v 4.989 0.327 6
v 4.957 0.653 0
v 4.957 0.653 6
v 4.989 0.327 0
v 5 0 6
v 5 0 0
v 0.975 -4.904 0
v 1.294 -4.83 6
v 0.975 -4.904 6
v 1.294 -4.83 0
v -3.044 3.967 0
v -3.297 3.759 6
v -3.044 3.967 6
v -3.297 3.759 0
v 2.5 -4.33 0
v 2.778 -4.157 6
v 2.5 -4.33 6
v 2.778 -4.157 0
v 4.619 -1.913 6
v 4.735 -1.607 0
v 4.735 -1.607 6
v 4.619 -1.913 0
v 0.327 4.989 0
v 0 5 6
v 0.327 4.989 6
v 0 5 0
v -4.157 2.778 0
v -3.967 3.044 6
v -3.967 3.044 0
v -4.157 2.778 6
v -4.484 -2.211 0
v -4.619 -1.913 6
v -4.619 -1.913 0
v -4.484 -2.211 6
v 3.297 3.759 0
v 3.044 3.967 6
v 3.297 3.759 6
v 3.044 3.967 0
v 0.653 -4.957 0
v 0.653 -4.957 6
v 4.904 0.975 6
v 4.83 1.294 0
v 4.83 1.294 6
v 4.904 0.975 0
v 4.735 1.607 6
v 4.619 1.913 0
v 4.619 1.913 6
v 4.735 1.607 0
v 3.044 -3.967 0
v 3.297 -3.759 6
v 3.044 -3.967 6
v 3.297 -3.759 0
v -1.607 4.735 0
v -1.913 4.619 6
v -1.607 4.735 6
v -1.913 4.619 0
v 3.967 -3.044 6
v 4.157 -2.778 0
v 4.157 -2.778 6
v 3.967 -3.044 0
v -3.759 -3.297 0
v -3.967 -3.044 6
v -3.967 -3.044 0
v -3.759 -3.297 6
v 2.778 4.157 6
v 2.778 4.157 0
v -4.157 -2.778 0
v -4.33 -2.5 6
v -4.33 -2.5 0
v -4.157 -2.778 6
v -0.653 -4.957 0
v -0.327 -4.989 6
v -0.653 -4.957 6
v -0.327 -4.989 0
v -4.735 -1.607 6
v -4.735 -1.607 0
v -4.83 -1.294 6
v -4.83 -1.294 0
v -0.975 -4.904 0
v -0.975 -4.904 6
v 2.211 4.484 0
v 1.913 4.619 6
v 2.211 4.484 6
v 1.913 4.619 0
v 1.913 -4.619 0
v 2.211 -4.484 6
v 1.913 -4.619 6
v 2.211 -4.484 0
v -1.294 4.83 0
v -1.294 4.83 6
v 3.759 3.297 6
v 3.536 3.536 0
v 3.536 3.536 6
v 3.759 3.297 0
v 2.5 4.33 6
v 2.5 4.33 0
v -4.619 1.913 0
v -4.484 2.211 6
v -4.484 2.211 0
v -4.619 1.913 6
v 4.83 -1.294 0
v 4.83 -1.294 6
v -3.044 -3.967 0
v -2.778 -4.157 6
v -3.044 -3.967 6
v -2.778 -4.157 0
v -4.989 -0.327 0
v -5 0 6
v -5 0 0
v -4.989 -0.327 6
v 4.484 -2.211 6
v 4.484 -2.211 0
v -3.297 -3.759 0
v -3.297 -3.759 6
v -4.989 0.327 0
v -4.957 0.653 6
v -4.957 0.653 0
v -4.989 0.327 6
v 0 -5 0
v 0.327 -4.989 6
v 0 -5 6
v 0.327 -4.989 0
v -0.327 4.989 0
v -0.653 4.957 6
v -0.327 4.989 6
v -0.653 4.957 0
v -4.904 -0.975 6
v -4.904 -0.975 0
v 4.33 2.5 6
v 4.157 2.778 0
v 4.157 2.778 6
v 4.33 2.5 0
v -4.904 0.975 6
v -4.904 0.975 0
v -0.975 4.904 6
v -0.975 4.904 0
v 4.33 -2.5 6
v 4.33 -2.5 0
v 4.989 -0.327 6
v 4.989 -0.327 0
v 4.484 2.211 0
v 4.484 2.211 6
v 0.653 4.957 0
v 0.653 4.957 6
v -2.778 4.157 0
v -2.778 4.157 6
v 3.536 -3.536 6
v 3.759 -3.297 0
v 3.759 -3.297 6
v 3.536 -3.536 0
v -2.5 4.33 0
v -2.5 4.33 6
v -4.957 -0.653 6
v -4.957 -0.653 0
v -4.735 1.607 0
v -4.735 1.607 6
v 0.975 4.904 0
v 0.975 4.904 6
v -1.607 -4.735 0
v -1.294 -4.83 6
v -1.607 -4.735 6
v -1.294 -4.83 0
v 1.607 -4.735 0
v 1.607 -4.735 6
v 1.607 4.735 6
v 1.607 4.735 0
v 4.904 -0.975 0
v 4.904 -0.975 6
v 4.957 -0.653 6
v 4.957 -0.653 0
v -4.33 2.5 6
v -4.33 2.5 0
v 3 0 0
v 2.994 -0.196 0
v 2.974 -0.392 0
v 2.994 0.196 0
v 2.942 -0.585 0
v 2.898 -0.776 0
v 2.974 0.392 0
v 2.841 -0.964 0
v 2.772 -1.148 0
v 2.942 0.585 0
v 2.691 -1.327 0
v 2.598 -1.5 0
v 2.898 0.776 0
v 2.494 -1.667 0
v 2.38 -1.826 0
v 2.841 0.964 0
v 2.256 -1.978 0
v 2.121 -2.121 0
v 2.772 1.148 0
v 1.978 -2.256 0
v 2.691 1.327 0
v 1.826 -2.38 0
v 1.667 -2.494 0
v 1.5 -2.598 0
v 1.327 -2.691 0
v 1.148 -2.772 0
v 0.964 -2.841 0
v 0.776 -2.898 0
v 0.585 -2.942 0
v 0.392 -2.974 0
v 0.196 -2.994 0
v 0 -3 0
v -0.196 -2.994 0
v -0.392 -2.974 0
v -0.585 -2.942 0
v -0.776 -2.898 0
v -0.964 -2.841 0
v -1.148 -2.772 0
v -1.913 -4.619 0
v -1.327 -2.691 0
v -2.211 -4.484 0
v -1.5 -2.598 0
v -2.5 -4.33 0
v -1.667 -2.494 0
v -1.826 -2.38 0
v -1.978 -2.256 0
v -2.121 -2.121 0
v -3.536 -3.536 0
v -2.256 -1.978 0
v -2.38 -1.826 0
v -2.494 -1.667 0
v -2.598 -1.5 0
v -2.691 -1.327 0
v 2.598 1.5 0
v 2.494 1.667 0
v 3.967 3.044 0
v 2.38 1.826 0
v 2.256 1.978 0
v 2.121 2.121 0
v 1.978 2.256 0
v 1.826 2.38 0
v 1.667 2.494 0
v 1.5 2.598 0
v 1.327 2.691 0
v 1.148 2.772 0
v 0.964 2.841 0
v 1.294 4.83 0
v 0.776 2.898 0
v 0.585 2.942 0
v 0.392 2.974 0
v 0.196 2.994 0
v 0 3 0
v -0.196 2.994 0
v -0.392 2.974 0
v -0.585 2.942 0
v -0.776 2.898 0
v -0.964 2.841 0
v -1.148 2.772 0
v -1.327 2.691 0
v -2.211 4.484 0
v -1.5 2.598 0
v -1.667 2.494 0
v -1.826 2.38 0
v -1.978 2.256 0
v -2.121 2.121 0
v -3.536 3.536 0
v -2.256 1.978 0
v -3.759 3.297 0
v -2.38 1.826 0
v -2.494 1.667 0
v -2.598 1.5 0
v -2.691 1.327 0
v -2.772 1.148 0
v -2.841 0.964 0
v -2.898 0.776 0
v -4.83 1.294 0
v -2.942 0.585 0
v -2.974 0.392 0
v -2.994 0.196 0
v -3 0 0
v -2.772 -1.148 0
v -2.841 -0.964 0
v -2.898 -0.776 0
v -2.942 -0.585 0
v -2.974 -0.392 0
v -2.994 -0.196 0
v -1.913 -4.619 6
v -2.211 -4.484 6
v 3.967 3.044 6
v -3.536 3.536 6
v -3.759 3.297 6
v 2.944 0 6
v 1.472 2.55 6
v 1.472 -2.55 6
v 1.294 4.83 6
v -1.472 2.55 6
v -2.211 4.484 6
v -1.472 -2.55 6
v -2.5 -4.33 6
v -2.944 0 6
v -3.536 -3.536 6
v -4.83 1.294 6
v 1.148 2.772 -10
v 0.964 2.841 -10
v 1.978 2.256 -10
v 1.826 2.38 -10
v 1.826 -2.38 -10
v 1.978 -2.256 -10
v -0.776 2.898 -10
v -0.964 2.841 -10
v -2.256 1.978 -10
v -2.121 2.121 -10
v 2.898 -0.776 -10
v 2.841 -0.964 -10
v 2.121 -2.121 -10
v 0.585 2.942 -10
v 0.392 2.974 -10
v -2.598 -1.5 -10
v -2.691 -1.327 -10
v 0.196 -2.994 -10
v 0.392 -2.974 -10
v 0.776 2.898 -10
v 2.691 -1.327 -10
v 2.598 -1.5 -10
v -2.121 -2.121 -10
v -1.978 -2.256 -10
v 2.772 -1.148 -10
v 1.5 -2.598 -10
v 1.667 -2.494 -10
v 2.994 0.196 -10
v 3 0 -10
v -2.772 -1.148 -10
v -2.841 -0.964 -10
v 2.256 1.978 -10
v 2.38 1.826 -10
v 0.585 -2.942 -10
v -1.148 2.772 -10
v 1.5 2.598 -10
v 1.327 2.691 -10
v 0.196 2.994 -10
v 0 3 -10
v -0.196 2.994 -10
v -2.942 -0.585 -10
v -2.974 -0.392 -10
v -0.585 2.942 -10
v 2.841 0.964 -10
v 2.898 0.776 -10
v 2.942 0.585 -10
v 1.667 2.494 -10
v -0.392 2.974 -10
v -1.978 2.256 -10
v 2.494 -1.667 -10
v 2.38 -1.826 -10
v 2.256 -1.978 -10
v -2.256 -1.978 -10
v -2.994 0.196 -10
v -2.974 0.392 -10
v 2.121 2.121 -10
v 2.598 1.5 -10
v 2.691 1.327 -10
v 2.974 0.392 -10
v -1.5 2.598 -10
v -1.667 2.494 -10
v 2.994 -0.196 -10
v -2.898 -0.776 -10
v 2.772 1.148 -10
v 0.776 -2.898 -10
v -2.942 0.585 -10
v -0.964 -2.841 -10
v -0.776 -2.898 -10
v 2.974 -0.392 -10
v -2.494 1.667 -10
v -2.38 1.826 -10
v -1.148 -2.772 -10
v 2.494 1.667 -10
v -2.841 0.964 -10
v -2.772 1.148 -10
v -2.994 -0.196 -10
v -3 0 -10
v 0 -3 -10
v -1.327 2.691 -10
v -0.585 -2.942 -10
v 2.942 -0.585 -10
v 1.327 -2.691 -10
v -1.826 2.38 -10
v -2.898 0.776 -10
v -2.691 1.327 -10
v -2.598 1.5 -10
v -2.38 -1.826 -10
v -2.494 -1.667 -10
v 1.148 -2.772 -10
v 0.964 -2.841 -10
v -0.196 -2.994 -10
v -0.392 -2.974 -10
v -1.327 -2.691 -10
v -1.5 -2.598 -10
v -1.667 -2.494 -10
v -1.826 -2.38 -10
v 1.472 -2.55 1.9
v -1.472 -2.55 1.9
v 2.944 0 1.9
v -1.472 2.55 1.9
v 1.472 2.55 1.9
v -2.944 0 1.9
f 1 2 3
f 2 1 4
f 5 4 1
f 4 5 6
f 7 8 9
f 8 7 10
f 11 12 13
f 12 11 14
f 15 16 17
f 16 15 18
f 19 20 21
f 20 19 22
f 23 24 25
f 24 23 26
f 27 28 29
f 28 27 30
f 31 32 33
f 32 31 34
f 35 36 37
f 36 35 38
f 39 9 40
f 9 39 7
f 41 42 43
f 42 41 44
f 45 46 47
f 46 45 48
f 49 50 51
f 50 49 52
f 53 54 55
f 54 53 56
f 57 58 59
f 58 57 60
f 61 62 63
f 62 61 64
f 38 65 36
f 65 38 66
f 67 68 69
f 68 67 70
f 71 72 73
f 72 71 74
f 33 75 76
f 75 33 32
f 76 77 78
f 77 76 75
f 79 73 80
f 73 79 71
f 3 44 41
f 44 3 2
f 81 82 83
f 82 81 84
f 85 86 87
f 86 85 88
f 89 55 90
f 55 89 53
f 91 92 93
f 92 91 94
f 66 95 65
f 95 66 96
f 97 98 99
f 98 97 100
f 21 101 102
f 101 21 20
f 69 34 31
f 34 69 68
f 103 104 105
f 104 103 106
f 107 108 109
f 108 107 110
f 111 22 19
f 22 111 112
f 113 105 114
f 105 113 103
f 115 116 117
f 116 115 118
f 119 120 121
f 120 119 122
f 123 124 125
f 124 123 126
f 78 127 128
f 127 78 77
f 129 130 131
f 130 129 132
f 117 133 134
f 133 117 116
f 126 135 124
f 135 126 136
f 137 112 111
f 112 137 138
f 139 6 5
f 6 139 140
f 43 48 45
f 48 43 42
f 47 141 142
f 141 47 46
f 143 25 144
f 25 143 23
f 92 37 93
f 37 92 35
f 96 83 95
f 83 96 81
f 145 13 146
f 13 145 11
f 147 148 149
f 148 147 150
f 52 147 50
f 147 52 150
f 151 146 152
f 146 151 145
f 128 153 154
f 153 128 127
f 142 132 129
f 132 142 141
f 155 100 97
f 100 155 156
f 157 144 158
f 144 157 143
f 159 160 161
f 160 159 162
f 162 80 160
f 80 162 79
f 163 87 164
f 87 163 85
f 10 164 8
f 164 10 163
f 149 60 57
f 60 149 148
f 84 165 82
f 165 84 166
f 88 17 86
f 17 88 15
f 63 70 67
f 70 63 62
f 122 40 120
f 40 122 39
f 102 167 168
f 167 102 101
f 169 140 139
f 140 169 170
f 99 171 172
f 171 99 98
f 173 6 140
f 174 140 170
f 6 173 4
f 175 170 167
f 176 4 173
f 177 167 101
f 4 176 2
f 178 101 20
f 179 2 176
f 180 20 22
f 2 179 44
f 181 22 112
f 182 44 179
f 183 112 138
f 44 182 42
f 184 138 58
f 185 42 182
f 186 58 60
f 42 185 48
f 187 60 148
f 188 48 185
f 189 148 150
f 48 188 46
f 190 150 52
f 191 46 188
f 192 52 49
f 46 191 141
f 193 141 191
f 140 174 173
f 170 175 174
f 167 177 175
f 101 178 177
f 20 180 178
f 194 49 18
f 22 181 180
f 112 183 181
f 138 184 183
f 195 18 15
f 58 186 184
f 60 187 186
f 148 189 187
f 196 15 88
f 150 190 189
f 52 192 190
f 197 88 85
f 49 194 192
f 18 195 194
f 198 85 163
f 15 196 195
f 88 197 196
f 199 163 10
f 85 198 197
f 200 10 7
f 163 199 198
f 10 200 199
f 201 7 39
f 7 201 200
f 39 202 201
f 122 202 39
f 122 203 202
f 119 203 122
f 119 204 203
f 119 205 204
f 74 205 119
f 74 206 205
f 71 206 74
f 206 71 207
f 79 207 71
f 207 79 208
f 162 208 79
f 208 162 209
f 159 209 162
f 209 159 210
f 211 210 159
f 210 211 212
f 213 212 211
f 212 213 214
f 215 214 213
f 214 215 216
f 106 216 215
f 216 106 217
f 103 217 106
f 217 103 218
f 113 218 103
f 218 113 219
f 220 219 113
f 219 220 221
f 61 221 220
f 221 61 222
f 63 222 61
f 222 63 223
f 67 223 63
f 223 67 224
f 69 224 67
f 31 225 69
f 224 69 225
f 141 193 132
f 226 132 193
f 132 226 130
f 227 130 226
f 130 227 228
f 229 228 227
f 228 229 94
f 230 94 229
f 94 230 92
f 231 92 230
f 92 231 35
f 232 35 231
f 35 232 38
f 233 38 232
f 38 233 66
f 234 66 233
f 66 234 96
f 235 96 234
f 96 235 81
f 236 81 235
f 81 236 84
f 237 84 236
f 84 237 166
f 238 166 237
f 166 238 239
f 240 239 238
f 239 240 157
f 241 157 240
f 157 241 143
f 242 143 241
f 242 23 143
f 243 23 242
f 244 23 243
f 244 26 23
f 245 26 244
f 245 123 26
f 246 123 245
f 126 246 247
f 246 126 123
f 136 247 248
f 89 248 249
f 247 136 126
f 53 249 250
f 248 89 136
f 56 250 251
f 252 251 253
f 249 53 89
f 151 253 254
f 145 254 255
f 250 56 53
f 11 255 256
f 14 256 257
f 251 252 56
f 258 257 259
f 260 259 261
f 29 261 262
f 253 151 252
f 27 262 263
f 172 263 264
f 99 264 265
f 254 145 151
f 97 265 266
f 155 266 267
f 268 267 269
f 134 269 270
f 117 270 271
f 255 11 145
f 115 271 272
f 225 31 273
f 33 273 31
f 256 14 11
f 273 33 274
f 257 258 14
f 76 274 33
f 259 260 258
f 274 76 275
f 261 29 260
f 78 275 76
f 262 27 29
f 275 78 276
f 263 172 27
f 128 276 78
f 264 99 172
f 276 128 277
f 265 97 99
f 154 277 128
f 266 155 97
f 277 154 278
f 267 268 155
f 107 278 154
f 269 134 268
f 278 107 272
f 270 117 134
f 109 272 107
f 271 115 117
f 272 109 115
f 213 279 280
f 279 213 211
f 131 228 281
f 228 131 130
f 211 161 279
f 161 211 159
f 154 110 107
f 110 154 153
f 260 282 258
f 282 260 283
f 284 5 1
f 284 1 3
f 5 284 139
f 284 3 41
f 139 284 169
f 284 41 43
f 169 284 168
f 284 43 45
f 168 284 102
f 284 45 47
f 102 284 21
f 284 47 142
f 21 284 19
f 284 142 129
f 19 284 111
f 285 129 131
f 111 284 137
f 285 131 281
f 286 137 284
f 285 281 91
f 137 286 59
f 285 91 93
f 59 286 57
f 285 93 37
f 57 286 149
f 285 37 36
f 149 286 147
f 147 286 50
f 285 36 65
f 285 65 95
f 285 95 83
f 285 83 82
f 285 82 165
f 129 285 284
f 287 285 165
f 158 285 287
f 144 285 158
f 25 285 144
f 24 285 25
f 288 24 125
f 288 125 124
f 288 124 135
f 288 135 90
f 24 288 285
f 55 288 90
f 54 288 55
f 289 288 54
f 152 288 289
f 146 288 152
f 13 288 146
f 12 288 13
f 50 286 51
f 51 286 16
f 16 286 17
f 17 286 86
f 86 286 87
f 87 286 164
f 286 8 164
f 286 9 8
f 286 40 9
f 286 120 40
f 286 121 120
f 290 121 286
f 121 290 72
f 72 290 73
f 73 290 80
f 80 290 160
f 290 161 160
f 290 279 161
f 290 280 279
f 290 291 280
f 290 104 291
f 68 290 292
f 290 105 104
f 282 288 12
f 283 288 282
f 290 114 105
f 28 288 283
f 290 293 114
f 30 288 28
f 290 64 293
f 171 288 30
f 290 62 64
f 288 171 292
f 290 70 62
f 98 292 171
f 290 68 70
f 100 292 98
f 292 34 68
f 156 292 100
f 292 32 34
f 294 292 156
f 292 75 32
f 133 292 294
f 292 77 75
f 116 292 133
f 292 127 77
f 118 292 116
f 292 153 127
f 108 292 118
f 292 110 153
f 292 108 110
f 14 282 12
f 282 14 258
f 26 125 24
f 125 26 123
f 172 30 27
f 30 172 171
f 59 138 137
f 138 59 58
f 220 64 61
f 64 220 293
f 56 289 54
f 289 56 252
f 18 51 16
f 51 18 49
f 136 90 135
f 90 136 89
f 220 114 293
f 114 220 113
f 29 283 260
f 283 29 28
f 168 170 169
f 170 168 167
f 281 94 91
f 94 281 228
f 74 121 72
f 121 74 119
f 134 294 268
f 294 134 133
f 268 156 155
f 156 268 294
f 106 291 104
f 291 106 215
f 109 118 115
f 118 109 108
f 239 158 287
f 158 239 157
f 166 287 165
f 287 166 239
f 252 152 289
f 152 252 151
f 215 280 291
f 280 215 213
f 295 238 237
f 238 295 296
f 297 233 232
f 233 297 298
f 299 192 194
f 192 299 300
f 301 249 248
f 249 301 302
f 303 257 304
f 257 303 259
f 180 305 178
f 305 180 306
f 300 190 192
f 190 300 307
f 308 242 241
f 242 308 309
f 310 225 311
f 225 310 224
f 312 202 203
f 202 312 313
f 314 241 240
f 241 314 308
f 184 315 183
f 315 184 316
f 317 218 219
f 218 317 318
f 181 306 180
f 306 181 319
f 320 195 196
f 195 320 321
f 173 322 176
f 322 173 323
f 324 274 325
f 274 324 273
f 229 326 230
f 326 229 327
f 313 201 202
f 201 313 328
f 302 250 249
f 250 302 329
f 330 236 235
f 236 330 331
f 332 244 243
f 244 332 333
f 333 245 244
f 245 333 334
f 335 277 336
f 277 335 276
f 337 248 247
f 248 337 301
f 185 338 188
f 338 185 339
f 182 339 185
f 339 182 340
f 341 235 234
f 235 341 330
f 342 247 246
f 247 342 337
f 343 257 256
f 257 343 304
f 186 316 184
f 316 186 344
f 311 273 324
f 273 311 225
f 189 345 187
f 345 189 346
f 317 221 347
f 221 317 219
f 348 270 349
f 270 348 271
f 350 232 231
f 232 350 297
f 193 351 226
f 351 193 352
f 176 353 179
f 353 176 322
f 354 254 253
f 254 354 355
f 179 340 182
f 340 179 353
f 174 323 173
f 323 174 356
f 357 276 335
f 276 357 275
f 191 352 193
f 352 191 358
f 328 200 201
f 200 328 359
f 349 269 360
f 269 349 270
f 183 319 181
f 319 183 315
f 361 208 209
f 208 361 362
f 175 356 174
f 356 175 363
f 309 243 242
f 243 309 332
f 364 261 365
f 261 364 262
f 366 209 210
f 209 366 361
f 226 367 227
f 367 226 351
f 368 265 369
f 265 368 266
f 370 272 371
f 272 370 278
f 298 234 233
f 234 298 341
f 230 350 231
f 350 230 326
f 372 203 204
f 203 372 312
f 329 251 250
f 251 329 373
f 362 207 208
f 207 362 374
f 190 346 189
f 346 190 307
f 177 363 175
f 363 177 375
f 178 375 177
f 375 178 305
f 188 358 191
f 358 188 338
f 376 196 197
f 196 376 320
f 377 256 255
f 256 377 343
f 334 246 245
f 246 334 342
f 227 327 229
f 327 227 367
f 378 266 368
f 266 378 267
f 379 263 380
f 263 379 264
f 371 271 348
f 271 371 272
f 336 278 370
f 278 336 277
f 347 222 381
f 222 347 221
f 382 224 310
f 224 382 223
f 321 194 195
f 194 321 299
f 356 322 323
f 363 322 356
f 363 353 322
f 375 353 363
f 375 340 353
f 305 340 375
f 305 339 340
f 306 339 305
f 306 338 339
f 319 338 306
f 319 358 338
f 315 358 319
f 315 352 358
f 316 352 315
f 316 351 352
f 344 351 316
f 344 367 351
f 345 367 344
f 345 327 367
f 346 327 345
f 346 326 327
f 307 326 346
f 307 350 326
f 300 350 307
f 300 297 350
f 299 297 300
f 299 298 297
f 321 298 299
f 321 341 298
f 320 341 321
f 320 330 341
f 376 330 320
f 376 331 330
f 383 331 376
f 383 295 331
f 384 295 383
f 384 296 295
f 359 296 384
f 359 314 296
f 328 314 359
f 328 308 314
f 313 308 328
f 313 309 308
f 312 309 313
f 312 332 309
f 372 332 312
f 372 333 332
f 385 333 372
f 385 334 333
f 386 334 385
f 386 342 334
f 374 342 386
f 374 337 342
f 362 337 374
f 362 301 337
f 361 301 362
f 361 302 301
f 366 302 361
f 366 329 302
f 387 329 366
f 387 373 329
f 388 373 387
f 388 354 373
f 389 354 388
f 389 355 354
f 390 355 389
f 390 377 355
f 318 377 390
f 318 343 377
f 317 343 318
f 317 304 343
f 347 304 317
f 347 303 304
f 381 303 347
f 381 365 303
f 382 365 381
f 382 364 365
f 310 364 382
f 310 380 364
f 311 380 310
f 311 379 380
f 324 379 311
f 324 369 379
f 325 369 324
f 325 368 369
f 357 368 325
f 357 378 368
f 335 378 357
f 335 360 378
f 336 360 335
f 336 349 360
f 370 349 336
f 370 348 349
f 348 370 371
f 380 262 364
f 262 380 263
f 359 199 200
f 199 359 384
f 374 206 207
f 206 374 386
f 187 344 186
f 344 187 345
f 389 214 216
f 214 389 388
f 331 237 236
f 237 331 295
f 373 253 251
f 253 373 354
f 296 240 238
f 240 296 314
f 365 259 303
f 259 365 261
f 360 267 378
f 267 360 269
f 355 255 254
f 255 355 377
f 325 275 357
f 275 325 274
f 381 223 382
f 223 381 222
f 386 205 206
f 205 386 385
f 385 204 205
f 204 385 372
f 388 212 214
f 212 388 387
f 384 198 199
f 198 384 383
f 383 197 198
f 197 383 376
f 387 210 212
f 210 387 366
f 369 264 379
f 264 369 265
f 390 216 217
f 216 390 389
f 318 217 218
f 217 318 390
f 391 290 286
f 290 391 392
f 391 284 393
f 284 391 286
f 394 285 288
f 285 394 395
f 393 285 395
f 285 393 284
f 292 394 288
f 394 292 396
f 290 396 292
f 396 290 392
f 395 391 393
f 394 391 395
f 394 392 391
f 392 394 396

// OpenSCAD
// Socket head cap screw (single connected solid)
// Requested: 6.0mm shank dia, 10.0mm head dia, 6.0mm head height, 10.0mm length under head

shaft_diameter_mm     = 6.0;   // shank diameter
length_under_head_mm  = 10.0;  // length under head
head_diameter_mm      = 10.0;  // head diameter
head_height_mm        = 6.0;   // head height

// Hex socket (typical for M6 SHCS is 5mm AF; keep parametric)
socket_af_mm          = 5.0;   // across flats
socket_depth_mm       = 4.0;   // socket depth
clearance_mm          = 0.10;  // small clearance for visible cut
overlap_mm            = 0.20;  // overlap to ensure robust boolean

$fn = 96;

// Convert hex across-flats to circumradius (distance center->vertex)
function hex_circumradius(af) = af / sqrt(3);

module socket_head_cap_screw() {
    head_r  = head_diameter_mm/2;
    shank_r = shaft_diameter_mm/2;

    // Place underside of head at z=0, head extends +Z, shank extends -Z
    difference() {
        union() {
            // Head
            translate([0, 0, head_height_mm/2])
                cylinder(h=head_height_mm, r=head_r, center=true);

            // Shank (connected to head with slight overlap)
            translate([0, 0, -length_under_head_mm/2 + overlap_mm/2])
                cylinder(h=length_under_head_mm + overlap_mm, r=shank_r, center=true);
        }

        // Hex socket cut from top face downward
        socket_r = hex_circumradius(socket_af_mm + clearance_mm);
        translate([0, 0, head_height_mm - socket_depth_mm/2])
            cylinder(h=socket_depth_mm + overlap_mm, r=socket_r, center=true, $fn=6);
    }
}

socket_head_cap_screw();
